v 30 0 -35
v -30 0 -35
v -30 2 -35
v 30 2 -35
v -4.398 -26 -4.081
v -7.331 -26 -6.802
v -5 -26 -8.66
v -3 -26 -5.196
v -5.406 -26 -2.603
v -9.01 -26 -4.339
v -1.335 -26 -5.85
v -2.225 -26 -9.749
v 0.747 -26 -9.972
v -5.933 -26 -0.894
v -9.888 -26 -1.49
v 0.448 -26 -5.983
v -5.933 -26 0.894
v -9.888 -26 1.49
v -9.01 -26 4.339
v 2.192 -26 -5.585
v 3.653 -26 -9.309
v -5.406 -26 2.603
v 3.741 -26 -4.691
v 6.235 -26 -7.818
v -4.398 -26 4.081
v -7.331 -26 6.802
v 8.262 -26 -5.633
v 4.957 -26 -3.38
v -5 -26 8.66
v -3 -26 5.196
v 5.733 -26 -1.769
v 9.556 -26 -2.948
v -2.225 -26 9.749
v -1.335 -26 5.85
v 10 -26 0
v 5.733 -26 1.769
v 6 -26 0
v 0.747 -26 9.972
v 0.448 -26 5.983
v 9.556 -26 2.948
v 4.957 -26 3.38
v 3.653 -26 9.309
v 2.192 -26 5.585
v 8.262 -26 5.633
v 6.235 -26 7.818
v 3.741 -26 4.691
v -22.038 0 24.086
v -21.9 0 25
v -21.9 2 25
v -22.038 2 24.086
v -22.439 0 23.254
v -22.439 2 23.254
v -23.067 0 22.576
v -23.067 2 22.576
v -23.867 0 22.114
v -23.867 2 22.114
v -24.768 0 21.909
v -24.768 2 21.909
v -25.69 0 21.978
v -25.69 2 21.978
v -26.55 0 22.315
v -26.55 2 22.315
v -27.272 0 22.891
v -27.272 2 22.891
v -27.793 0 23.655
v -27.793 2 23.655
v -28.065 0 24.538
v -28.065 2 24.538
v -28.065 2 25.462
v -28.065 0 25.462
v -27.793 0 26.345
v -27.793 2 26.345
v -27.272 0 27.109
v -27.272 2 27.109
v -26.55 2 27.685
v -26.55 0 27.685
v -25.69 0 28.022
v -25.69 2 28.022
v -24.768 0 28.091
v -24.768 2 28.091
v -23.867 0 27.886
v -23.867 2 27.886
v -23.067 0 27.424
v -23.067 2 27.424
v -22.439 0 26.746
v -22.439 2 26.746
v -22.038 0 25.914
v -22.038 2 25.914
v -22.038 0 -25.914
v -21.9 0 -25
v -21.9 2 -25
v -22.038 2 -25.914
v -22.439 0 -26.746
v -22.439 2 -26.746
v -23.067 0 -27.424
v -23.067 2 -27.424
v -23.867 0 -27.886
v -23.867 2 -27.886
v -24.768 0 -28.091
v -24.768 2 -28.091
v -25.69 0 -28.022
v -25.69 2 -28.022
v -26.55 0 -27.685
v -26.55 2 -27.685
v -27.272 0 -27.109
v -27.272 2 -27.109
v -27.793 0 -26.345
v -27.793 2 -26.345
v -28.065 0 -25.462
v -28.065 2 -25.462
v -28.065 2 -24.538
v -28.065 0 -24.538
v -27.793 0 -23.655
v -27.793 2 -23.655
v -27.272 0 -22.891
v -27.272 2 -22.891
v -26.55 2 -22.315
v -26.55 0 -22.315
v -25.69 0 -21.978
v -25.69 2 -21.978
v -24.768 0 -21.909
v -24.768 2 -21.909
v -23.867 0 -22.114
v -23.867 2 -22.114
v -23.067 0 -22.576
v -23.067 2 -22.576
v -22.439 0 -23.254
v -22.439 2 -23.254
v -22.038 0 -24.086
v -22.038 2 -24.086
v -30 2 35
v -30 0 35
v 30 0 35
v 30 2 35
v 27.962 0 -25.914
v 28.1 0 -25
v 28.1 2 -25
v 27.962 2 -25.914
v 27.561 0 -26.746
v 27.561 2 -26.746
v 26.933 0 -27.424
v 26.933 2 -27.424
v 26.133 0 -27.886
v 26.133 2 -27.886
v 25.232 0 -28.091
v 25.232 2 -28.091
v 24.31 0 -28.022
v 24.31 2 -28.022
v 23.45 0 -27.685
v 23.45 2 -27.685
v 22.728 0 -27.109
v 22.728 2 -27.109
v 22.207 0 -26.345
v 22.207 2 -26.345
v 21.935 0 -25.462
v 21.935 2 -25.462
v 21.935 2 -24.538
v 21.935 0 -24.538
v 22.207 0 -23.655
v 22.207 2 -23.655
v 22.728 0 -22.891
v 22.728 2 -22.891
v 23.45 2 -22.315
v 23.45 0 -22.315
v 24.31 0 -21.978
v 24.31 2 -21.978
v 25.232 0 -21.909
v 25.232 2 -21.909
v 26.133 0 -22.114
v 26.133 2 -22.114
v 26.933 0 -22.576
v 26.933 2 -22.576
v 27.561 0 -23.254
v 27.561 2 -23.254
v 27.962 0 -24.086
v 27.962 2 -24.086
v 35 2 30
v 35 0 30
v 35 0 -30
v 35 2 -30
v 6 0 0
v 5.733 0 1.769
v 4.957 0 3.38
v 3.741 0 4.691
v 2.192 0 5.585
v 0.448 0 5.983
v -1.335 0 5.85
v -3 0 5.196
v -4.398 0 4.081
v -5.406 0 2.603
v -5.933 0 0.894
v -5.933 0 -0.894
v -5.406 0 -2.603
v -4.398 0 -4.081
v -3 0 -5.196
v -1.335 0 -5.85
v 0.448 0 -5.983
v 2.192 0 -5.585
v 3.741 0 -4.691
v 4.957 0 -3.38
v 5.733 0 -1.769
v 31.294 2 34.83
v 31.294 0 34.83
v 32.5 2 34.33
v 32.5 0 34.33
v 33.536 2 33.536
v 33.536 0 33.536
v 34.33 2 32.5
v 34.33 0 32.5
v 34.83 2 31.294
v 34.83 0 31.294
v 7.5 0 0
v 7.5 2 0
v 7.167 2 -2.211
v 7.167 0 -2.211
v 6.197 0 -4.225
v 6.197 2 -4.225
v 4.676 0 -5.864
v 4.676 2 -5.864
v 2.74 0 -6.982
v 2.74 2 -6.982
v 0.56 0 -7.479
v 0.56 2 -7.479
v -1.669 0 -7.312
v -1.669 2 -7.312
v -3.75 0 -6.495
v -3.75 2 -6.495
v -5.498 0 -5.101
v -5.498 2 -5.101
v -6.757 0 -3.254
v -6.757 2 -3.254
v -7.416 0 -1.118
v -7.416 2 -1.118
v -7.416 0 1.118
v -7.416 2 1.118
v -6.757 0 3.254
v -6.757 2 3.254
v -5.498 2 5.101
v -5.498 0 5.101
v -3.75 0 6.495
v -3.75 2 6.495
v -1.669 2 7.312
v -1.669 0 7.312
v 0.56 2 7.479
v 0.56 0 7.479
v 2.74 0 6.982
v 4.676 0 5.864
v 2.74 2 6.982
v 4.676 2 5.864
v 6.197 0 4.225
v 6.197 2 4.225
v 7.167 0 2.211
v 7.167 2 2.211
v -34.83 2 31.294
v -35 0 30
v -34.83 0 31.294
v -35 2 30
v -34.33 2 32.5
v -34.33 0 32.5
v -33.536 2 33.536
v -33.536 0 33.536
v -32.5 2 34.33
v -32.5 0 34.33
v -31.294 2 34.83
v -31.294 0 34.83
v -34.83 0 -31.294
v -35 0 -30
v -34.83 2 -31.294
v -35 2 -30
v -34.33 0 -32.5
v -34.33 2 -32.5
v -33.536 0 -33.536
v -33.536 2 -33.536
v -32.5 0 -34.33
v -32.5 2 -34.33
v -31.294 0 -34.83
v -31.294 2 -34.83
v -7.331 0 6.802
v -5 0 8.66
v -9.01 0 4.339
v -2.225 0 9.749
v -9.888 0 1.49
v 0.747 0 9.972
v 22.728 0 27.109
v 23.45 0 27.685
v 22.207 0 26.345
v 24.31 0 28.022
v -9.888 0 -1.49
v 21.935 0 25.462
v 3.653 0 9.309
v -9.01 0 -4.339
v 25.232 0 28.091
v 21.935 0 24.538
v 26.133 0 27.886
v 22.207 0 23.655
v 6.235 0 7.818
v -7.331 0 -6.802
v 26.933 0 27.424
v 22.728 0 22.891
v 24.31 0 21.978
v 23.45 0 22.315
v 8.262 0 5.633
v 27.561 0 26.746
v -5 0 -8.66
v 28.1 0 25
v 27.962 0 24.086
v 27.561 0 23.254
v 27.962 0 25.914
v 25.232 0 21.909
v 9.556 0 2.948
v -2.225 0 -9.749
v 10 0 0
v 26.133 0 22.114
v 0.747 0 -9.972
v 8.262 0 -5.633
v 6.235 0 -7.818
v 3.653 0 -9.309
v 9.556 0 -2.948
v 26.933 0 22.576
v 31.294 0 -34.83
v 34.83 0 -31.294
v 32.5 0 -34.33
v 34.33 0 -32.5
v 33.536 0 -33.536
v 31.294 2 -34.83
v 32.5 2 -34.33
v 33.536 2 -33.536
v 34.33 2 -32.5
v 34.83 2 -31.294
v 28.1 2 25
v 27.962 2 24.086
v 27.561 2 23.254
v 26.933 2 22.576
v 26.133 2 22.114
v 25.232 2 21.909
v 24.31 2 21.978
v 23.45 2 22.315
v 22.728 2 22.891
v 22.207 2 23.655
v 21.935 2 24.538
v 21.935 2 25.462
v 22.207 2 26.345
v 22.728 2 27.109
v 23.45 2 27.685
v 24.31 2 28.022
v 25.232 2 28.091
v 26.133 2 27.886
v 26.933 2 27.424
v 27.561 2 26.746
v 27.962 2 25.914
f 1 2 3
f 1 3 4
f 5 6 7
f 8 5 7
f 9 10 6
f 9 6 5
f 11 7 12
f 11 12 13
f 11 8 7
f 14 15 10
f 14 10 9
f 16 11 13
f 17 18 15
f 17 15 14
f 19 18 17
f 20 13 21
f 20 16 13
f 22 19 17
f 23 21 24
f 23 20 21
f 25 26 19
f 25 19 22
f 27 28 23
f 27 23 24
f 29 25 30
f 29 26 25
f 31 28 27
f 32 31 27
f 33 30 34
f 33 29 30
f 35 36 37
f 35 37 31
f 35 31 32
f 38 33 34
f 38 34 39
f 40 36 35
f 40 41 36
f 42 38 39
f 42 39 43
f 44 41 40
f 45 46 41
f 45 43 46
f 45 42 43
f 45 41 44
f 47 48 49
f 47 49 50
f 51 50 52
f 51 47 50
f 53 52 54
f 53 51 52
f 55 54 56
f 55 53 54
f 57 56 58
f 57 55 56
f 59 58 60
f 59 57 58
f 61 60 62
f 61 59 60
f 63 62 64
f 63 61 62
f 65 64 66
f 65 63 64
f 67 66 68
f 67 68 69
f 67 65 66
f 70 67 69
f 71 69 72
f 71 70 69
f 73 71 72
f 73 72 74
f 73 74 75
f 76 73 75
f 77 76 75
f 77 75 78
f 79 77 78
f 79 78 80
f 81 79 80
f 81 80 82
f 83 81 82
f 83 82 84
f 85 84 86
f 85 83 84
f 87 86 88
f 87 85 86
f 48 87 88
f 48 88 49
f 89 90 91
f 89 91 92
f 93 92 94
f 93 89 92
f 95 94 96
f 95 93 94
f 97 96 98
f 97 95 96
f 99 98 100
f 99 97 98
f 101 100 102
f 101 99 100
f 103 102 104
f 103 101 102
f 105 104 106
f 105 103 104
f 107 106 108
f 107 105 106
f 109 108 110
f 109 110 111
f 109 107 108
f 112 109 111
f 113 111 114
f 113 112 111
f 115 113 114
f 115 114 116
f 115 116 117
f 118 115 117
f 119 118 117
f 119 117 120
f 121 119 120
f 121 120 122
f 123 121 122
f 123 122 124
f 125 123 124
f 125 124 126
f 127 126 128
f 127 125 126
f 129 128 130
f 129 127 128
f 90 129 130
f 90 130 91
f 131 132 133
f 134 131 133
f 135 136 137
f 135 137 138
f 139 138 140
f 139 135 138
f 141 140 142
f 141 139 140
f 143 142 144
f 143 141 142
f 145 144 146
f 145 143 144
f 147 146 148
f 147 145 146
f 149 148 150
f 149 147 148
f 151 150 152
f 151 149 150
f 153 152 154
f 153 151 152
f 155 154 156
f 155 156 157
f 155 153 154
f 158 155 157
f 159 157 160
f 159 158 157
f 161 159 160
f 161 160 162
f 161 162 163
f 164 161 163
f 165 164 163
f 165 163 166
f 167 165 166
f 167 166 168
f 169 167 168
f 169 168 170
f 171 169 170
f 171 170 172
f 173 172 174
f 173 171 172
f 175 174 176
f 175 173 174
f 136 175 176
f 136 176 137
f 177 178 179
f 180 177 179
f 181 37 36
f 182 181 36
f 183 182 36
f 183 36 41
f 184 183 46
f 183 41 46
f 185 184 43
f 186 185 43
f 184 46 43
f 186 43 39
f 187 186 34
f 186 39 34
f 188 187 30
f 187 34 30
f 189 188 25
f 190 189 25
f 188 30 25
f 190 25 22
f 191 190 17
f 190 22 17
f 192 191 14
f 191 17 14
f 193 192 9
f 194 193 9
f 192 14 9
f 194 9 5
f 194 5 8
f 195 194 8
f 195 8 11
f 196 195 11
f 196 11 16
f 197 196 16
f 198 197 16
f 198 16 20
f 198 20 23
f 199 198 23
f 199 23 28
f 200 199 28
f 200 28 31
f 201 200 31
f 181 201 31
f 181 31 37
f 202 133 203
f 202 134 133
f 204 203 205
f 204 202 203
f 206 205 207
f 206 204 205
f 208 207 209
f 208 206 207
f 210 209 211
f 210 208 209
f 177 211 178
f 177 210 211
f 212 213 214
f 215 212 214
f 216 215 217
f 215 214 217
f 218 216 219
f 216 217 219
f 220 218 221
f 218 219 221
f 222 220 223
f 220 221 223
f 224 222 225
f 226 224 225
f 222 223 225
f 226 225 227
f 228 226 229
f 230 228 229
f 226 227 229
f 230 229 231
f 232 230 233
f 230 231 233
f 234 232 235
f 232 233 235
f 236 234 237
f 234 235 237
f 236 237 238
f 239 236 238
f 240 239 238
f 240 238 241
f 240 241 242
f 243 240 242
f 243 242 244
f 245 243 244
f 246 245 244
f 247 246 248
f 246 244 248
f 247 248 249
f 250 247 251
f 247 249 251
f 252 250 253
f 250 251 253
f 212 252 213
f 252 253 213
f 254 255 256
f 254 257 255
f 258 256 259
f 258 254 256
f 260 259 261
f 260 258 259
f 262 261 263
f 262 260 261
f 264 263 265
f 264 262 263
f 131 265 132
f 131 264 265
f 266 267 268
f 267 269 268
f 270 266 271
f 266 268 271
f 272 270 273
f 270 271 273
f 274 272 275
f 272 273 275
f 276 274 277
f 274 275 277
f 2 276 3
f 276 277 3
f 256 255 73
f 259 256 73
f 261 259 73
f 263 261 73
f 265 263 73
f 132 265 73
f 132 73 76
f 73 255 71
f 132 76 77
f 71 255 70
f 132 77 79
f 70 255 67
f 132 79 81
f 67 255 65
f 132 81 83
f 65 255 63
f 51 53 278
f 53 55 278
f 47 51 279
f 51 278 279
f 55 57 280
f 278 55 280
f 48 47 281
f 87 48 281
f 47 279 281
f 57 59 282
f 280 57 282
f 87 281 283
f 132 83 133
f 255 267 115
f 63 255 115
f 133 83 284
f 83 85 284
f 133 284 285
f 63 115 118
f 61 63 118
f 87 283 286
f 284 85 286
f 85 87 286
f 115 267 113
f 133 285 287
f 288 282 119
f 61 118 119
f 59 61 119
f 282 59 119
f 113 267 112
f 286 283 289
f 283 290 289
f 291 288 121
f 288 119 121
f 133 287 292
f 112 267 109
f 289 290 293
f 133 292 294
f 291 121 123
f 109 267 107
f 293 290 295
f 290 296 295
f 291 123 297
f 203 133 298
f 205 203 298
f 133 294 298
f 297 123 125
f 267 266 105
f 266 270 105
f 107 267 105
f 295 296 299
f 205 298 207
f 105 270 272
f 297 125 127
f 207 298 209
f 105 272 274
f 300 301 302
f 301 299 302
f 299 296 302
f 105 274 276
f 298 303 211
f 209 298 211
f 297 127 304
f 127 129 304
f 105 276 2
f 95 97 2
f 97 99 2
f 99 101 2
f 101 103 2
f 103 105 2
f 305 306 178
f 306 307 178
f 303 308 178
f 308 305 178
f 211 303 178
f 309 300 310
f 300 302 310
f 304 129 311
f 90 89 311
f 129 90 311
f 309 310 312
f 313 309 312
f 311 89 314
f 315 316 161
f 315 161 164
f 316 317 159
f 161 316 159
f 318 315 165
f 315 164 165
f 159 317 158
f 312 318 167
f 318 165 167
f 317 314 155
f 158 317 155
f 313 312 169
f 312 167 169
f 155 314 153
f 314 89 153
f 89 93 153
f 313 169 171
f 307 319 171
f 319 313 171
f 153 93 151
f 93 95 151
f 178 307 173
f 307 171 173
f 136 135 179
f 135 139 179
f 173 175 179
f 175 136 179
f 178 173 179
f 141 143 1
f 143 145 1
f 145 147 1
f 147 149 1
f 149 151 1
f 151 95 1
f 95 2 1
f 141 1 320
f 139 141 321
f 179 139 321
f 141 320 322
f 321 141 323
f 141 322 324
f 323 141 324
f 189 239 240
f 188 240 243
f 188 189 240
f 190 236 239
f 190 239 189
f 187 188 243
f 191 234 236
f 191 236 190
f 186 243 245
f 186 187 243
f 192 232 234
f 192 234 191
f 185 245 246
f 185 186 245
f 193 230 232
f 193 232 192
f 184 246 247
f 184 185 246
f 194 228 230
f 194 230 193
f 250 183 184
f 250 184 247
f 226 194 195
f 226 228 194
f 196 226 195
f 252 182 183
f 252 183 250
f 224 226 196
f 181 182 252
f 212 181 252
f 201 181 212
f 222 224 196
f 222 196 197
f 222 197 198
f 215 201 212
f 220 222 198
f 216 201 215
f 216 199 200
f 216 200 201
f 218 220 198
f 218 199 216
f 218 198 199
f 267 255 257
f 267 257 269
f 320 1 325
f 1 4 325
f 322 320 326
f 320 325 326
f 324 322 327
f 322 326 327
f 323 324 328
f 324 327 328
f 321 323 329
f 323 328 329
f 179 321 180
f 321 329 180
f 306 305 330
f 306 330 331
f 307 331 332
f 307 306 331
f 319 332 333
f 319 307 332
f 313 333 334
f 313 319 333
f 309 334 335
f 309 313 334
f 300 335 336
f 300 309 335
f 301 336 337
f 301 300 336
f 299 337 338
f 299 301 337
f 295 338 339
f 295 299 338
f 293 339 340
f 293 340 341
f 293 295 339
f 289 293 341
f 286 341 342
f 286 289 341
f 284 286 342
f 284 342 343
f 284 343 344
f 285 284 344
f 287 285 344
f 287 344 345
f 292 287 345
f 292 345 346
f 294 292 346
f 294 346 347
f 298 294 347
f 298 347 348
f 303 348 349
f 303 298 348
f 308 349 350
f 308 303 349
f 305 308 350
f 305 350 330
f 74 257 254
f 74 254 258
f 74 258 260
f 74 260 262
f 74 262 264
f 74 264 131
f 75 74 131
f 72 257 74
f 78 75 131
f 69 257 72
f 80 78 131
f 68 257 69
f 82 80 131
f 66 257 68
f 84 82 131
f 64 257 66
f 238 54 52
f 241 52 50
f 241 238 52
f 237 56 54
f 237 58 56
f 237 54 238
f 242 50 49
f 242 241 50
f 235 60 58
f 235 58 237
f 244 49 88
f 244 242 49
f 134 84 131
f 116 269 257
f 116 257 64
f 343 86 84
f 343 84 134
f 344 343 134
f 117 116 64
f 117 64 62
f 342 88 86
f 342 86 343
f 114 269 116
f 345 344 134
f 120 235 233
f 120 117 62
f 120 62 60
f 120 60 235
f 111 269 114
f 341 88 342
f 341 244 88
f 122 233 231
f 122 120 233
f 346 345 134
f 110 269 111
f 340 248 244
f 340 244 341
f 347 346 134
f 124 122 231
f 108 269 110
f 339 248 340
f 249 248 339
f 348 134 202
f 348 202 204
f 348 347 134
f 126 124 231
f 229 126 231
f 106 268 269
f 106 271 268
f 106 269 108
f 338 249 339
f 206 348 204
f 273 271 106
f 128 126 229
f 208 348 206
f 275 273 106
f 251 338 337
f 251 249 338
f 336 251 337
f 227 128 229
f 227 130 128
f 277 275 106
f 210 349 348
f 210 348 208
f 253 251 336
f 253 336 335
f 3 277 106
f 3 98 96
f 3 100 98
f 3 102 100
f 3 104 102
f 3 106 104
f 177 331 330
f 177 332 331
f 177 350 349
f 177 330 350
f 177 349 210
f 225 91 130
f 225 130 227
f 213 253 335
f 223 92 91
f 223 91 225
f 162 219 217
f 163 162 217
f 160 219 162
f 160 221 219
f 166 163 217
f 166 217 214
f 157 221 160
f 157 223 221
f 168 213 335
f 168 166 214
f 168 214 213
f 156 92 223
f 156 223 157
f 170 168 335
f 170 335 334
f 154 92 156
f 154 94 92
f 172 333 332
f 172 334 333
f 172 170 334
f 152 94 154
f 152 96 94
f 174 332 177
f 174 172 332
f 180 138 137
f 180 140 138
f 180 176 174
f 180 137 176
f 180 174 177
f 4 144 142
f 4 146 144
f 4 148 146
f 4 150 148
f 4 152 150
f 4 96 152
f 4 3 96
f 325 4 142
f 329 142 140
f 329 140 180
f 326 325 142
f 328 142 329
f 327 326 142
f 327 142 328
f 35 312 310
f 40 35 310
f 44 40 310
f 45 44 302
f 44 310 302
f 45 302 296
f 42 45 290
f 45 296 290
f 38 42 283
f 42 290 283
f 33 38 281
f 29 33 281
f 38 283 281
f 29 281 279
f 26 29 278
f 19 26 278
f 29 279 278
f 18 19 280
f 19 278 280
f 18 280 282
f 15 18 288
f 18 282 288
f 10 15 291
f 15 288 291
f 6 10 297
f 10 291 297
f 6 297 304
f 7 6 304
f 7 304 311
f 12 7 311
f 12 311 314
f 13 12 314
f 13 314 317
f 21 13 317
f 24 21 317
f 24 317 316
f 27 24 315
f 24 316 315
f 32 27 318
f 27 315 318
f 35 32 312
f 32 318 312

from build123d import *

# Parameters (mm, degrees)
SKETCH1_W           = 70
SKETCH1_H           = 70
SKETCH1_R           = 3.1
BOSS_EXTRUDE1_DEPTH = 2
FILLET1_R           = 5
SKETCH2_R           = 10
BOSS_EXTRUDE2_DEPTH = 26
SKETCH5_R           = 6
CUT_EXTRUDE1_DEPTH  = 29
SKETCH6_R           = 7.5
CUT_EXTRUDE2_DEPTH  = 2


with BuildPart() as part:
    # Sketch1 → Boss-Extrude1 (new body)
    with BuildSketch(Plane(origin=(0, 0, 0), x_dir=(1, 0, 0), z_dir=(0, 1, 0))):
        Rectangle(SKETCH1_W, SKETCH1_H)
        with Locations((25, 25)):
            Circle(SKETCH1_R, mode=Mode.SUBTRACT)
        with Locations((-25, -25)):
            Circle(SKETCH1_R, mode=Mode.SUBTRACT)
        with Locations((-25, 25)):
            Circle(SKETCH1_R, mode=Mode.SUBTRACT)
        with Locations((25, -25)):
            Circle(SKETCH1_R, mode=Mode.SUBTRACT)
    extrude(amount=BOSS_EXTRUDE1_DEPTH)

    # Fillet1
    fillet1_edges = [part.edges().sort_by_distance(p)[0] for p in [
        (35, 1, 35),
        (-35, 1, 35),
        (-35, 1, -35),
        (35, 1, -35),
    ]]
    fillet(fillet1_edges, radius=FILLET1_R)

    # Sketch2 → Boss-Extrude2 (add)
    with BuildSketch(Plane.XZ):
        Circle(SKETCH2_R)
    extrude(amount=BOSS_EXTRUDE2_DEPTH)

    # Sketch5 → Cut-Extrude1 (cut, through all)
    with BuildSketch(Plane.XZ.offset(26)):
        Circle(SKETCH5_R)
    extrude(amount=-CUT_EXTRUDE1_DEPTH, mode=Mode.SUBTRACT)

    # Sketch6 → Cut-Extrude2 (cut)
    with BuildSketch(Plane(origin=(0, 2, 0), x_dir=(1, 0, 0), z_dir=(0, 1, 0))):
        Circle(SKETCH6_R)
    extrude(amount=-CUT_EXTRUDE2_DEPTH, mode=Mode.SUBTRACT)


solid = part.part
